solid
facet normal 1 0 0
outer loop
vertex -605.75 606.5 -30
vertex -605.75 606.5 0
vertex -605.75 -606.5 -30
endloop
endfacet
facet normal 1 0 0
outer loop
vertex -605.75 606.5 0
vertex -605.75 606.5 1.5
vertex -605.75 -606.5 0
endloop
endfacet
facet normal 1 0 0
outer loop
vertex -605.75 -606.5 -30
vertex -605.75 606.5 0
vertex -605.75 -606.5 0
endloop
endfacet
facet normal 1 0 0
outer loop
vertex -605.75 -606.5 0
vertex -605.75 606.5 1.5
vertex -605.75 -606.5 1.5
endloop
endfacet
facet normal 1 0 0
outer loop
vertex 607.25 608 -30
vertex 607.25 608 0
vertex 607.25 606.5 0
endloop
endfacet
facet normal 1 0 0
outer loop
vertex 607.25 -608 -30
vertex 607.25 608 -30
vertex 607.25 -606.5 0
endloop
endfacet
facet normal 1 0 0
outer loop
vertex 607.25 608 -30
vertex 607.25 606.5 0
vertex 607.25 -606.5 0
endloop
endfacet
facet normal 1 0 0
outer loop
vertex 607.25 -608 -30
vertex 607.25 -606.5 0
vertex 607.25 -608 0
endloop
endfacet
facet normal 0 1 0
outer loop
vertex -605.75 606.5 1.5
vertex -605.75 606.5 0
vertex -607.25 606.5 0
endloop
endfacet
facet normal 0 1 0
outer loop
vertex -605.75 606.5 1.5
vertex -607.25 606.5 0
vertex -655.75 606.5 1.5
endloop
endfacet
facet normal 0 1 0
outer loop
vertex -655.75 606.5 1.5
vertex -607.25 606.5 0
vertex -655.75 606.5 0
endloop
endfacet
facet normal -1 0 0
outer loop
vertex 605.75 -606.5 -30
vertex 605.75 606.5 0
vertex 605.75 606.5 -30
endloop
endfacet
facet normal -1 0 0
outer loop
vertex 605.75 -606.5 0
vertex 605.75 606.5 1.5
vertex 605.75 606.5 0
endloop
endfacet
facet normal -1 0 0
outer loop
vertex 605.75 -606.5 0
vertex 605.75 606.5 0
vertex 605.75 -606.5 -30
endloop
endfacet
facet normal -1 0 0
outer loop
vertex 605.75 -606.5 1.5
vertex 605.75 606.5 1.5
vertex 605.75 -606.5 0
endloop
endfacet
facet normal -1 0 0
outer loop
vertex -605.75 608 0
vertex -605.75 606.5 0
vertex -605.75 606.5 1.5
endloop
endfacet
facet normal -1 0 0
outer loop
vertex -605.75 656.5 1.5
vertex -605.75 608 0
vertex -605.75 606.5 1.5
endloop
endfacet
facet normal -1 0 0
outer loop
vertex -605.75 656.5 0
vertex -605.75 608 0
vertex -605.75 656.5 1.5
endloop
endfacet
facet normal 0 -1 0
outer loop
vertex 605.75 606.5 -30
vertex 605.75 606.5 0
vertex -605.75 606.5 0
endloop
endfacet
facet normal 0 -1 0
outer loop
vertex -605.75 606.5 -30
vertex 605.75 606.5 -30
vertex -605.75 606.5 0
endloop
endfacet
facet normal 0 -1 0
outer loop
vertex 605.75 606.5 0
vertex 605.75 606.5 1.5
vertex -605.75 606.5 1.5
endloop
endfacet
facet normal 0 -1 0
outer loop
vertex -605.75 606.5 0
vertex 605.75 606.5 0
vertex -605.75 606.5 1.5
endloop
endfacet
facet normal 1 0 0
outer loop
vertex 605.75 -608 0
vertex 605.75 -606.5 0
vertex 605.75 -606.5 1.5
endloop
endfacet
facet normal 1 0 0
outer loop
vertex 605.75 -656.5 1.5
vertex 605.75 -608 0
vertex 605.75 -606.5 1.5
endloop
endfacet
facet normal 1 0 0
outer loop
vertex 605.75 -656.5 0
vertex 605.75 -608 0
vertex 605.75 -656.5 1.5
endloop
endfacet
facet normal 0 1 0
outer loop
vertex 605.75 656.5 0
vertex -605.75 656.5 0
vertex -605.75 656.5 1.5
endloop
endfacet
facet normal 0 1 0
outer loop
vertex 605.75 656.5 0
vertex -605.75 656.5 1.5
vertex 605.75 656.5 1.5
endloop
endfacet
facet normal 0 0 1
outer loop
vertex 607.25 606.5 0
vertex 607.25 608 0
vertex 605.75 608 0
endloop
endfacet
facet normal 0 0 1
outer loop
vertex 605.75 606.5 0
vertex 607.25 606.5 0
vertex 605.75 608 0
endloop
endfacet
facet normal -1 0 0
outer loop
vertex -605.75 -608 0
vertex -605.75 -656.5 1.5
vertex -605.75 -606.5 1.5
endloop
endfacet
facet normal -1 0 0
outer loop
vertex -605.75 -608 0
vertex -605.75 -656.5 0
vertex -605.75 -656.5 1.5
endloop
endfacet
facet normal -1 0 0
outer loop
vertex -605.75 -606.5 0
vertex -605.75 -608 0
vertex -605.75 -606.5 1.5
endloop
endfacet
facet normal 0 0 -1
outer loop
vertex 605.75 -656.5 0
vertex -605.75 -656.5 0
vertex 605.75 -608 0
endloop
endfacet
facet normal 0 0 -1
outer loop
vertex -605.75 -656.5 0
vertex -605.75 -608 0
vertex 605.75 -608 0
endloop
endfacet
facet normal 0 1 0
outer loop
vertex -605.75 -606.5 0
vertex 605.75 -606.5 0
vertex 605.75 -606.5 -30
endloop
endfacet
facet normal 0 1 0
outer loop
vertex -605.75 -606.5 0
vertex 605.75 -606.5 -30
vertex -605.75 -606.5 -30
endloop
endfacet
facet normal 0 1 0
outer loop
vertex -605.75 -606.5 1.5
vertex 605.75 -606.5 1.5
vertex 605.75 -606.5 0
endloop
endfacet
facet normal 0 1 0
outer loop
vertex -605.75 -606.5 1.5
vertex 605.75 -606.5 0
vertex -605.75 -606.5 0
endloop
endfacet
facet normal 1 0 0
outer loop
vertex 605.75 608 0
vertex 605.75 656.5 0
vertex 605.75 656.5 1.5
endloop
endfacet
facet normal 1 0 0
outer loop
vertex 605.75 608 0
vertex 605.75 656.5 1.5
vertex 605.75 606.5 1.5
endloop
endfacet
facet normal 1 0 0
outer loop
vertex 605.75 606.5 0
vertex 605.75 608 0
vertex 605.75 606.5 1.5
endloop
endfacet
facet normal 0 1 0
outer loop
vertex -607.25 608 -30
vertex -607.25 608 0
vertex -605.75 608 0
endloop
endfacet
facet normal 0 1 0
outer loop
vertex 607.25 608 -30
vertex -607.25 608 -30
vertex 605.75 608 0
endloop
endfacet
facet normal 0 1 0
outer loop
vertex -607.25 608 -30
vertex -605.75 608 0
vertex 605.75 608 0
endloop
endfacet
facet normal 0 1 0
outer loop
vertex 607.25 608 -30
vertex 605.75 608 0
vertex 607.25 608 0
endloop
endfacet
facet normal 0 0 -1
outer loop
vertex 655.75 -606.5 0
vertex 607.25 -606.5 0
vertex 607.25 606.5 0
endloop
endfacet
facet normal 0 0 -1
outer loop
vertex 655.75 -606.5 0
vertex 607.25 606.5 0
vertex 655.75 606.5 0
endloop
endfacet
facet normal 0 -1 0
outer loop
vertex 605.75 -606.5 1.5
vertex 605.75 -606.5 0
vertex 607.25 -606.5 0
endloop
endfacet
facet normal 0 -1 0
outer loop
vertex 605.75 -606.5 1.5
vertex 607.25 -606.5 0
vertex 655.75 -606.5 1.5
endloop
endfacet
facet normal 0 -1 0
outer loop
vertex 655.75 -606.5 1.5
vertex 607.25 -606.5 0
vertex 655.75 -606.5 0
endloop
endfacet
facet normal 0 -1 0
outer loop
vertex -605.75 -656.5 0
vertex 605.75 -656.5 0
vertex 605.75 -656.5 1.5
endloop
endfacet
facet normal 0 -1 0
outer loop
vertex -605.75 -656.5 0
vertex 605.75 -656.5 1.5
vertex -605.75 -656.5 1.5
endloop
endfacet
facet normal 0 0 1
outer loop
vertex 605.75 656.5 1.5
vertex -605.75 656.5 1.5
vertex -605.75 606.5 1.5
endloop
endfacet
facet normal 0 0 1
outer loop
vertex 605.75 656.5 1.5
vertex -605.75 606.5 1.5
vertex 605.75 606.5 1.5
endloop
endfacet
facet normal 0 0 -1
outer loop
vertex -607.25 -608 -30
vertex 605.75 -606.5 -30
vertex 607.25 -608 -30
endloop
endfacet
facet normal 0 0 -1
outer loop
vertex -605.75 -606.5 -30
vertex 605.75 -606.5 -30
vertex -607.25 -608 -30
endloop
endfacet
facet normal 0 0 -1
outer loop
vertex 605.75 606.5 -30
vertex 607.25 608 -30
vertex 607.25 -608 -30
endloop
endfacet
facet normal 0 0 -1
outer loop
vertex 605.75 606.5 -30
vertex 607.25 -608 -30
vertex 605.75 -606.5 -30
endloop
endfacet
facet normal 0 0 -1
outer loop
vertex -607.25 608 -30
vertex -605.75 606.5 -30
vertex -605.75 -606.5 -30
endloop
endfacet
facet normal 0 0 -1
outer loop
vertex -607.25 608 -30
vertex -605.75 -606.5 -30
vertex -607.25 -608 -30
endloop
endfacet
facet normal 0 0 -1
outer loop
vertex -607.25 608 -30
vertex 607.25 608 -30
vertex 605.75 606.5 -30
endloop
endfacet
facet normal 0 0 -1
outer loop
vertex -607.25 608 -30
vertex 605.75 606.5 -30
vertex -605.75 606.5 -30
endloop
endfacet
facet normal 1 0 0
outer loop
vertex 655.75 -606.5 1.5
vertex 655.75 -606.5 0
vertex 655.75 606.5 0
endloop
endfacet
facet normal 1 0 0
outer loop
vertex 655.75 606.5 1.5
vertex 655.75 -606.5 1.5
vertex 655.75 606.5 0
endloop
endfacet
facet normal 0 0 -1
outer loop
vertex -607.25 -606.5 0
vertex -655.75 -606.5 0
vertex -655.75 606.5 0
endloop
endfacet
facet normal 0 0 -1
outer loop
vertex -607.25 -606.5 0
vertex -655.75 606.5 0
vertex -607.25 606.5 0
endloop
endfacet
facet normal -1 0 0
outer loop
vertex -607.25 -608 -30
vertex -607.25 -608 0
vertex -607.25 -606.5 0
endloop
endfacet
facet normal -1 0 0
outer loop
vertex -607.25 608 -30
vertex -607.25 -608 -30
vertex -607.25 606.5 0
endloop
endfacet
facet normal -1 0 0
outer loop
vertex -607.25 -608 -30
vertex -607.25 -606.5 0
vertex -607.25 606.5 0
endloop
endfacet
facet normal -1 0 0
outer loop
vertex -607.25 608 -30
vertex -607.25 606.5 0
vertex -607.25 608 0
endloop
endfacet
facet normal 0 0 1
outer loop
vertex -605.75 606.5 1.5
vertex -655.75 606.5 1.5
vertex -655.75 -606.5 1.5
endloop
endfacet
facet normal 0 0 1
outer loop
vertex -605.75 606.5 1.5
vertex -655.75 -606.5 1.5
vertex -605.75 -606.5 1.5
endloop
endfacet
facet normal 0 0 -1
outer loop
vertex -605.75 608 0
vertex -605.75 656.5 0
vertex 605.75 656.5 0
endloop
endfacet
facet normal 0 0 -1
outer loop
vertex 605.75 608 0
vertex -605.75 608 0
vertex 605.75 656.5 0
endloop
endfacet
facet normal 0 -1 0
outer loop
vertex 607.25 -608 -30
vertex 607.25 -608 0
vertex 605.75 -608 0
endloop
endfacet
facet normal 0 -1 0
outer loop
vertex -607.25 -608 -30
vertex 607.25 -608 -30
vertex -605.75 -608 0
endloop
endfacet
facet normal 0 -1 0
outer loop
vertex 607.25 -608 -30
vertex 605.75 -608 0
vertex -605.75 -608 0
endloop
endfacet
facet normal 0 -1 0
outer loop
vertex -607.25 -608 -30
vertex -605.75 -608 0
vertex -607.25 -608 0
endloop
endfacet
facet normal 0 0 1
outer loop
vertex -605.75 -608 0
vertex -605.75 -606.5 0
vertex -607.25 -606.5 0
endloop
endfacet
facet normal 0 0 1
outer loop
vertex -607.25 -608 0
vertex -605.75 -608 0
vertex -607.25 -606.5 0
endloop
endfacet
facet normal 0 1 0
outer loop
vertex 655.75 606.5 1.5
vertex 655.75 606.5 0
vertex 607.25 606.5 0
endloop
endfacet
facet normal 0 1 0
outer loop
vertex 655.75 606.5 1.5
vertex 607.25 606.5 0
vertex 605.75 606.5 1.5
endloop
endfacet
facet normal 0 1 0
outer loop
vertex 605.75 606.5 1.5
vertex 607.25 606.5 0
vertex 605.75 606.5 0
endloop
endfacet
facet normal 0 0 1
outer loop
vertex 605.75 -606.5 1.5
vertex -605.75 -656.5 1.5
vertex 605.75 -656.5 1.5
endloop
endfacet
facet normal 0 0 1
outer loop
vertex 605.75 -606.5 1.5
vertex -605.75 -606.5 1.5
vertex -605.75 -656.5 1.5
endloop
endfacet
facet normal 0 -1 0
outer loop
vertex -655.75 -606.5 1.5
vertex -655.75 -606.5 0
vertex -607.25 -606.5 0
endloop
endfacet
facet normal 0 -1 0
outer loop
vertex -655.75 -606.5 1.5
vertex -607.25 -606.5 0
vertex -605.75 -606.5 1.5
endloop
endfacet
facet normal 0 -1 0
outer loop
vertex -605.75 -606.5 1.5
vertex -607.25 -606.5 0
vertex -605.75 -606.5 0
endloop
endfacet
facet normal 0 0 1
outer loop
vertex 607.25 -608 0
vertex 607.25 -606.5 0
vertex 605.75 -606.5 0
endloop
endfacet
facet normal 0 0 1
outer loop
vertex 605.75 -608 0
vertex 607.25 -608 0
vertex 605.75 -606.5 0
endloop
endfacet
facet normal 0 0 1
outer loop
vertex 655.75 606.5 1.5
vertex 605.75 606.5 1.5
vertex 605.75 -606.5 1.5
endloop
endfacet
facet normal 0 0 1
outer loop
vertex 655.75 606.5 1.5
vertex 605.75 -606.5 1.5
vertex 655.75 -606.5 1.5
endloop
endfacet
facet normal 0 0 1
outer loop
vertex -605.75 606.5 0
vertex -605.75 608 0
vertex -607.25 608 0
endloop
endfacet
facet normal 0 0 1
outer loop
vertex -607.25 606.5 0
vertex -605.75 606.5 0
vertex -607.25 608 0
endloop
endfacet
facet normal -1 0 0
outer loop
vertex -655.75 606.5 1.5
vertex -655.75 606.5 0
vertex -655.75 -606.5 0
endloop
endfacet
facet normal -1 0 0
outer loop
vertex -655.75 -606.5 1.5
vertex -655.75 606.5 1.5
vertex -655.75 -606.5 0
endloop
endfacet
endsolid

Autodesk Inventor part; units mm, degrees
ref_plane "YZ Plane" through (0, 0, 0) normal (1, 0, 0) x (0, 1, 0)
ref_plane "XZ Plane" through (0, 0, 0) normal (0, 1, 0) x (-1, 0, 0)
ref_plane "XY Plane" through (0, 0, 0) normal (0, 0, 1) x (1, 0, 0)
sketch "Sketch1" plane through (0, 0, 0) normal (0, 0, 1) x (1, 0, 0)
  line L0 (604.25, 605) -> (604.25, -605)
  line L1 (604.25, -605) -> (-604.25, -605)
  line L2 (-604.25, -605) -> (-604.25, 605)
  line L3 (-604.25, 605) -> (604.25, 605)
  line L4 (605.75, -606.5) -> (-605.75, -606.5)
  line L5 (605.75, 606.5) -> (605.75, -606.5)
  line L6 (-605.75, 606.5) -> (605.75, 606.5)
  line L7 (-605.75, -606.5) -> (-605.75, 606.5)
  line L8 (-605.75, 606.5) -> (-655.75, 606.5)
  line L9 (-655.75, 606.5) -> (-655.75, -606.5)
  line L10 (-655.75, -606.5) -> (-605.75, -606.5)
  line L11 (-605.75, -606.5) -> (-605.75, 606.5)
  line L12 (-605.75, -606.5) -> (605.75, -606.5)
  line L13 (605.75, -606.5) -> (605.75, -656.5)
  line L14 (605.75, -656.5) -> (-605.75, -656.5)
  line L15 (-605.75, -656.5) -> (-605.75, -606.5)
  line L16 (605.75, -606.5) -> (655.75, -606.5)
  line L17 (655.75, -606.5) -> (655.75, 606.5)
  line L18 (655.75, 606.5) -> (605.75, 606.5)
  line L19 (605.75, 606.5) -> (605.75, -606.5)
  line L20 (605.75, 606.5) -> (-605.75, 606.5)
  line L21 (-605.75, 606.5) -> (-605.75, 656.5)
  line L22 (-605.75, 656.5) -> (605.75, 656.5)
  line L23 (605.75, 656.5) -> (605.75, 606.5)
  point P0 (0, 0)
  point P1 (0, 0)
  point P2 (-605.75, -606.5)
  point P3 (-605.75, -606.5)
  point P4 (-605.75, -606.5)
  point P5 (-605.75, -606.5)
  dimension "d0" = 50
  dimension "d1" = 50
  dimension "d2" = 50
  dimension "d3" = 50
extrude "Extrusion1" add sketch "Sketch1" along normal blind 1.5 contours L13 L14 L15 L4 | L5 L18 L17 L16 | L10 L9 L8 L7 | L6 L21 L22 L23
sketch "Sketch2" plane through (0, 0, 0) normal (0, 0, -1) x (-1, 0, 0)
  line L0 (-605.75, 606.5) -> (-605.75, -606.5) projected
  line L1 (-605.75, -606.5) -> (605.75, -606.5) projected
  line L2 (-605.75, 606.5) -> (605.75, 606.5)
  line L3 (605.75, 606.5) -> (605.75, -606.5)
  line L4 (605.75, -606.5) -> (-605.75, -606.5)
  line L5 (-605.75, -606.5) -> (-605.75, 606.5)
  line L6 (607.25, 608) -> (-607.25, 608)
  line L7 (-607.25, 608) -> (-607.25, -608)
  line L8 (-607.25, -608) -> (607.25, -608)
  line L9 (607.25, -608) -> (607.25, 608)
  point P0 (0, 0)
  dimension "d6" = 1.5
extrude "Extrusion2" add sketch "Sketch2" along normal blind 30
properties part number "Fastening Frame"
